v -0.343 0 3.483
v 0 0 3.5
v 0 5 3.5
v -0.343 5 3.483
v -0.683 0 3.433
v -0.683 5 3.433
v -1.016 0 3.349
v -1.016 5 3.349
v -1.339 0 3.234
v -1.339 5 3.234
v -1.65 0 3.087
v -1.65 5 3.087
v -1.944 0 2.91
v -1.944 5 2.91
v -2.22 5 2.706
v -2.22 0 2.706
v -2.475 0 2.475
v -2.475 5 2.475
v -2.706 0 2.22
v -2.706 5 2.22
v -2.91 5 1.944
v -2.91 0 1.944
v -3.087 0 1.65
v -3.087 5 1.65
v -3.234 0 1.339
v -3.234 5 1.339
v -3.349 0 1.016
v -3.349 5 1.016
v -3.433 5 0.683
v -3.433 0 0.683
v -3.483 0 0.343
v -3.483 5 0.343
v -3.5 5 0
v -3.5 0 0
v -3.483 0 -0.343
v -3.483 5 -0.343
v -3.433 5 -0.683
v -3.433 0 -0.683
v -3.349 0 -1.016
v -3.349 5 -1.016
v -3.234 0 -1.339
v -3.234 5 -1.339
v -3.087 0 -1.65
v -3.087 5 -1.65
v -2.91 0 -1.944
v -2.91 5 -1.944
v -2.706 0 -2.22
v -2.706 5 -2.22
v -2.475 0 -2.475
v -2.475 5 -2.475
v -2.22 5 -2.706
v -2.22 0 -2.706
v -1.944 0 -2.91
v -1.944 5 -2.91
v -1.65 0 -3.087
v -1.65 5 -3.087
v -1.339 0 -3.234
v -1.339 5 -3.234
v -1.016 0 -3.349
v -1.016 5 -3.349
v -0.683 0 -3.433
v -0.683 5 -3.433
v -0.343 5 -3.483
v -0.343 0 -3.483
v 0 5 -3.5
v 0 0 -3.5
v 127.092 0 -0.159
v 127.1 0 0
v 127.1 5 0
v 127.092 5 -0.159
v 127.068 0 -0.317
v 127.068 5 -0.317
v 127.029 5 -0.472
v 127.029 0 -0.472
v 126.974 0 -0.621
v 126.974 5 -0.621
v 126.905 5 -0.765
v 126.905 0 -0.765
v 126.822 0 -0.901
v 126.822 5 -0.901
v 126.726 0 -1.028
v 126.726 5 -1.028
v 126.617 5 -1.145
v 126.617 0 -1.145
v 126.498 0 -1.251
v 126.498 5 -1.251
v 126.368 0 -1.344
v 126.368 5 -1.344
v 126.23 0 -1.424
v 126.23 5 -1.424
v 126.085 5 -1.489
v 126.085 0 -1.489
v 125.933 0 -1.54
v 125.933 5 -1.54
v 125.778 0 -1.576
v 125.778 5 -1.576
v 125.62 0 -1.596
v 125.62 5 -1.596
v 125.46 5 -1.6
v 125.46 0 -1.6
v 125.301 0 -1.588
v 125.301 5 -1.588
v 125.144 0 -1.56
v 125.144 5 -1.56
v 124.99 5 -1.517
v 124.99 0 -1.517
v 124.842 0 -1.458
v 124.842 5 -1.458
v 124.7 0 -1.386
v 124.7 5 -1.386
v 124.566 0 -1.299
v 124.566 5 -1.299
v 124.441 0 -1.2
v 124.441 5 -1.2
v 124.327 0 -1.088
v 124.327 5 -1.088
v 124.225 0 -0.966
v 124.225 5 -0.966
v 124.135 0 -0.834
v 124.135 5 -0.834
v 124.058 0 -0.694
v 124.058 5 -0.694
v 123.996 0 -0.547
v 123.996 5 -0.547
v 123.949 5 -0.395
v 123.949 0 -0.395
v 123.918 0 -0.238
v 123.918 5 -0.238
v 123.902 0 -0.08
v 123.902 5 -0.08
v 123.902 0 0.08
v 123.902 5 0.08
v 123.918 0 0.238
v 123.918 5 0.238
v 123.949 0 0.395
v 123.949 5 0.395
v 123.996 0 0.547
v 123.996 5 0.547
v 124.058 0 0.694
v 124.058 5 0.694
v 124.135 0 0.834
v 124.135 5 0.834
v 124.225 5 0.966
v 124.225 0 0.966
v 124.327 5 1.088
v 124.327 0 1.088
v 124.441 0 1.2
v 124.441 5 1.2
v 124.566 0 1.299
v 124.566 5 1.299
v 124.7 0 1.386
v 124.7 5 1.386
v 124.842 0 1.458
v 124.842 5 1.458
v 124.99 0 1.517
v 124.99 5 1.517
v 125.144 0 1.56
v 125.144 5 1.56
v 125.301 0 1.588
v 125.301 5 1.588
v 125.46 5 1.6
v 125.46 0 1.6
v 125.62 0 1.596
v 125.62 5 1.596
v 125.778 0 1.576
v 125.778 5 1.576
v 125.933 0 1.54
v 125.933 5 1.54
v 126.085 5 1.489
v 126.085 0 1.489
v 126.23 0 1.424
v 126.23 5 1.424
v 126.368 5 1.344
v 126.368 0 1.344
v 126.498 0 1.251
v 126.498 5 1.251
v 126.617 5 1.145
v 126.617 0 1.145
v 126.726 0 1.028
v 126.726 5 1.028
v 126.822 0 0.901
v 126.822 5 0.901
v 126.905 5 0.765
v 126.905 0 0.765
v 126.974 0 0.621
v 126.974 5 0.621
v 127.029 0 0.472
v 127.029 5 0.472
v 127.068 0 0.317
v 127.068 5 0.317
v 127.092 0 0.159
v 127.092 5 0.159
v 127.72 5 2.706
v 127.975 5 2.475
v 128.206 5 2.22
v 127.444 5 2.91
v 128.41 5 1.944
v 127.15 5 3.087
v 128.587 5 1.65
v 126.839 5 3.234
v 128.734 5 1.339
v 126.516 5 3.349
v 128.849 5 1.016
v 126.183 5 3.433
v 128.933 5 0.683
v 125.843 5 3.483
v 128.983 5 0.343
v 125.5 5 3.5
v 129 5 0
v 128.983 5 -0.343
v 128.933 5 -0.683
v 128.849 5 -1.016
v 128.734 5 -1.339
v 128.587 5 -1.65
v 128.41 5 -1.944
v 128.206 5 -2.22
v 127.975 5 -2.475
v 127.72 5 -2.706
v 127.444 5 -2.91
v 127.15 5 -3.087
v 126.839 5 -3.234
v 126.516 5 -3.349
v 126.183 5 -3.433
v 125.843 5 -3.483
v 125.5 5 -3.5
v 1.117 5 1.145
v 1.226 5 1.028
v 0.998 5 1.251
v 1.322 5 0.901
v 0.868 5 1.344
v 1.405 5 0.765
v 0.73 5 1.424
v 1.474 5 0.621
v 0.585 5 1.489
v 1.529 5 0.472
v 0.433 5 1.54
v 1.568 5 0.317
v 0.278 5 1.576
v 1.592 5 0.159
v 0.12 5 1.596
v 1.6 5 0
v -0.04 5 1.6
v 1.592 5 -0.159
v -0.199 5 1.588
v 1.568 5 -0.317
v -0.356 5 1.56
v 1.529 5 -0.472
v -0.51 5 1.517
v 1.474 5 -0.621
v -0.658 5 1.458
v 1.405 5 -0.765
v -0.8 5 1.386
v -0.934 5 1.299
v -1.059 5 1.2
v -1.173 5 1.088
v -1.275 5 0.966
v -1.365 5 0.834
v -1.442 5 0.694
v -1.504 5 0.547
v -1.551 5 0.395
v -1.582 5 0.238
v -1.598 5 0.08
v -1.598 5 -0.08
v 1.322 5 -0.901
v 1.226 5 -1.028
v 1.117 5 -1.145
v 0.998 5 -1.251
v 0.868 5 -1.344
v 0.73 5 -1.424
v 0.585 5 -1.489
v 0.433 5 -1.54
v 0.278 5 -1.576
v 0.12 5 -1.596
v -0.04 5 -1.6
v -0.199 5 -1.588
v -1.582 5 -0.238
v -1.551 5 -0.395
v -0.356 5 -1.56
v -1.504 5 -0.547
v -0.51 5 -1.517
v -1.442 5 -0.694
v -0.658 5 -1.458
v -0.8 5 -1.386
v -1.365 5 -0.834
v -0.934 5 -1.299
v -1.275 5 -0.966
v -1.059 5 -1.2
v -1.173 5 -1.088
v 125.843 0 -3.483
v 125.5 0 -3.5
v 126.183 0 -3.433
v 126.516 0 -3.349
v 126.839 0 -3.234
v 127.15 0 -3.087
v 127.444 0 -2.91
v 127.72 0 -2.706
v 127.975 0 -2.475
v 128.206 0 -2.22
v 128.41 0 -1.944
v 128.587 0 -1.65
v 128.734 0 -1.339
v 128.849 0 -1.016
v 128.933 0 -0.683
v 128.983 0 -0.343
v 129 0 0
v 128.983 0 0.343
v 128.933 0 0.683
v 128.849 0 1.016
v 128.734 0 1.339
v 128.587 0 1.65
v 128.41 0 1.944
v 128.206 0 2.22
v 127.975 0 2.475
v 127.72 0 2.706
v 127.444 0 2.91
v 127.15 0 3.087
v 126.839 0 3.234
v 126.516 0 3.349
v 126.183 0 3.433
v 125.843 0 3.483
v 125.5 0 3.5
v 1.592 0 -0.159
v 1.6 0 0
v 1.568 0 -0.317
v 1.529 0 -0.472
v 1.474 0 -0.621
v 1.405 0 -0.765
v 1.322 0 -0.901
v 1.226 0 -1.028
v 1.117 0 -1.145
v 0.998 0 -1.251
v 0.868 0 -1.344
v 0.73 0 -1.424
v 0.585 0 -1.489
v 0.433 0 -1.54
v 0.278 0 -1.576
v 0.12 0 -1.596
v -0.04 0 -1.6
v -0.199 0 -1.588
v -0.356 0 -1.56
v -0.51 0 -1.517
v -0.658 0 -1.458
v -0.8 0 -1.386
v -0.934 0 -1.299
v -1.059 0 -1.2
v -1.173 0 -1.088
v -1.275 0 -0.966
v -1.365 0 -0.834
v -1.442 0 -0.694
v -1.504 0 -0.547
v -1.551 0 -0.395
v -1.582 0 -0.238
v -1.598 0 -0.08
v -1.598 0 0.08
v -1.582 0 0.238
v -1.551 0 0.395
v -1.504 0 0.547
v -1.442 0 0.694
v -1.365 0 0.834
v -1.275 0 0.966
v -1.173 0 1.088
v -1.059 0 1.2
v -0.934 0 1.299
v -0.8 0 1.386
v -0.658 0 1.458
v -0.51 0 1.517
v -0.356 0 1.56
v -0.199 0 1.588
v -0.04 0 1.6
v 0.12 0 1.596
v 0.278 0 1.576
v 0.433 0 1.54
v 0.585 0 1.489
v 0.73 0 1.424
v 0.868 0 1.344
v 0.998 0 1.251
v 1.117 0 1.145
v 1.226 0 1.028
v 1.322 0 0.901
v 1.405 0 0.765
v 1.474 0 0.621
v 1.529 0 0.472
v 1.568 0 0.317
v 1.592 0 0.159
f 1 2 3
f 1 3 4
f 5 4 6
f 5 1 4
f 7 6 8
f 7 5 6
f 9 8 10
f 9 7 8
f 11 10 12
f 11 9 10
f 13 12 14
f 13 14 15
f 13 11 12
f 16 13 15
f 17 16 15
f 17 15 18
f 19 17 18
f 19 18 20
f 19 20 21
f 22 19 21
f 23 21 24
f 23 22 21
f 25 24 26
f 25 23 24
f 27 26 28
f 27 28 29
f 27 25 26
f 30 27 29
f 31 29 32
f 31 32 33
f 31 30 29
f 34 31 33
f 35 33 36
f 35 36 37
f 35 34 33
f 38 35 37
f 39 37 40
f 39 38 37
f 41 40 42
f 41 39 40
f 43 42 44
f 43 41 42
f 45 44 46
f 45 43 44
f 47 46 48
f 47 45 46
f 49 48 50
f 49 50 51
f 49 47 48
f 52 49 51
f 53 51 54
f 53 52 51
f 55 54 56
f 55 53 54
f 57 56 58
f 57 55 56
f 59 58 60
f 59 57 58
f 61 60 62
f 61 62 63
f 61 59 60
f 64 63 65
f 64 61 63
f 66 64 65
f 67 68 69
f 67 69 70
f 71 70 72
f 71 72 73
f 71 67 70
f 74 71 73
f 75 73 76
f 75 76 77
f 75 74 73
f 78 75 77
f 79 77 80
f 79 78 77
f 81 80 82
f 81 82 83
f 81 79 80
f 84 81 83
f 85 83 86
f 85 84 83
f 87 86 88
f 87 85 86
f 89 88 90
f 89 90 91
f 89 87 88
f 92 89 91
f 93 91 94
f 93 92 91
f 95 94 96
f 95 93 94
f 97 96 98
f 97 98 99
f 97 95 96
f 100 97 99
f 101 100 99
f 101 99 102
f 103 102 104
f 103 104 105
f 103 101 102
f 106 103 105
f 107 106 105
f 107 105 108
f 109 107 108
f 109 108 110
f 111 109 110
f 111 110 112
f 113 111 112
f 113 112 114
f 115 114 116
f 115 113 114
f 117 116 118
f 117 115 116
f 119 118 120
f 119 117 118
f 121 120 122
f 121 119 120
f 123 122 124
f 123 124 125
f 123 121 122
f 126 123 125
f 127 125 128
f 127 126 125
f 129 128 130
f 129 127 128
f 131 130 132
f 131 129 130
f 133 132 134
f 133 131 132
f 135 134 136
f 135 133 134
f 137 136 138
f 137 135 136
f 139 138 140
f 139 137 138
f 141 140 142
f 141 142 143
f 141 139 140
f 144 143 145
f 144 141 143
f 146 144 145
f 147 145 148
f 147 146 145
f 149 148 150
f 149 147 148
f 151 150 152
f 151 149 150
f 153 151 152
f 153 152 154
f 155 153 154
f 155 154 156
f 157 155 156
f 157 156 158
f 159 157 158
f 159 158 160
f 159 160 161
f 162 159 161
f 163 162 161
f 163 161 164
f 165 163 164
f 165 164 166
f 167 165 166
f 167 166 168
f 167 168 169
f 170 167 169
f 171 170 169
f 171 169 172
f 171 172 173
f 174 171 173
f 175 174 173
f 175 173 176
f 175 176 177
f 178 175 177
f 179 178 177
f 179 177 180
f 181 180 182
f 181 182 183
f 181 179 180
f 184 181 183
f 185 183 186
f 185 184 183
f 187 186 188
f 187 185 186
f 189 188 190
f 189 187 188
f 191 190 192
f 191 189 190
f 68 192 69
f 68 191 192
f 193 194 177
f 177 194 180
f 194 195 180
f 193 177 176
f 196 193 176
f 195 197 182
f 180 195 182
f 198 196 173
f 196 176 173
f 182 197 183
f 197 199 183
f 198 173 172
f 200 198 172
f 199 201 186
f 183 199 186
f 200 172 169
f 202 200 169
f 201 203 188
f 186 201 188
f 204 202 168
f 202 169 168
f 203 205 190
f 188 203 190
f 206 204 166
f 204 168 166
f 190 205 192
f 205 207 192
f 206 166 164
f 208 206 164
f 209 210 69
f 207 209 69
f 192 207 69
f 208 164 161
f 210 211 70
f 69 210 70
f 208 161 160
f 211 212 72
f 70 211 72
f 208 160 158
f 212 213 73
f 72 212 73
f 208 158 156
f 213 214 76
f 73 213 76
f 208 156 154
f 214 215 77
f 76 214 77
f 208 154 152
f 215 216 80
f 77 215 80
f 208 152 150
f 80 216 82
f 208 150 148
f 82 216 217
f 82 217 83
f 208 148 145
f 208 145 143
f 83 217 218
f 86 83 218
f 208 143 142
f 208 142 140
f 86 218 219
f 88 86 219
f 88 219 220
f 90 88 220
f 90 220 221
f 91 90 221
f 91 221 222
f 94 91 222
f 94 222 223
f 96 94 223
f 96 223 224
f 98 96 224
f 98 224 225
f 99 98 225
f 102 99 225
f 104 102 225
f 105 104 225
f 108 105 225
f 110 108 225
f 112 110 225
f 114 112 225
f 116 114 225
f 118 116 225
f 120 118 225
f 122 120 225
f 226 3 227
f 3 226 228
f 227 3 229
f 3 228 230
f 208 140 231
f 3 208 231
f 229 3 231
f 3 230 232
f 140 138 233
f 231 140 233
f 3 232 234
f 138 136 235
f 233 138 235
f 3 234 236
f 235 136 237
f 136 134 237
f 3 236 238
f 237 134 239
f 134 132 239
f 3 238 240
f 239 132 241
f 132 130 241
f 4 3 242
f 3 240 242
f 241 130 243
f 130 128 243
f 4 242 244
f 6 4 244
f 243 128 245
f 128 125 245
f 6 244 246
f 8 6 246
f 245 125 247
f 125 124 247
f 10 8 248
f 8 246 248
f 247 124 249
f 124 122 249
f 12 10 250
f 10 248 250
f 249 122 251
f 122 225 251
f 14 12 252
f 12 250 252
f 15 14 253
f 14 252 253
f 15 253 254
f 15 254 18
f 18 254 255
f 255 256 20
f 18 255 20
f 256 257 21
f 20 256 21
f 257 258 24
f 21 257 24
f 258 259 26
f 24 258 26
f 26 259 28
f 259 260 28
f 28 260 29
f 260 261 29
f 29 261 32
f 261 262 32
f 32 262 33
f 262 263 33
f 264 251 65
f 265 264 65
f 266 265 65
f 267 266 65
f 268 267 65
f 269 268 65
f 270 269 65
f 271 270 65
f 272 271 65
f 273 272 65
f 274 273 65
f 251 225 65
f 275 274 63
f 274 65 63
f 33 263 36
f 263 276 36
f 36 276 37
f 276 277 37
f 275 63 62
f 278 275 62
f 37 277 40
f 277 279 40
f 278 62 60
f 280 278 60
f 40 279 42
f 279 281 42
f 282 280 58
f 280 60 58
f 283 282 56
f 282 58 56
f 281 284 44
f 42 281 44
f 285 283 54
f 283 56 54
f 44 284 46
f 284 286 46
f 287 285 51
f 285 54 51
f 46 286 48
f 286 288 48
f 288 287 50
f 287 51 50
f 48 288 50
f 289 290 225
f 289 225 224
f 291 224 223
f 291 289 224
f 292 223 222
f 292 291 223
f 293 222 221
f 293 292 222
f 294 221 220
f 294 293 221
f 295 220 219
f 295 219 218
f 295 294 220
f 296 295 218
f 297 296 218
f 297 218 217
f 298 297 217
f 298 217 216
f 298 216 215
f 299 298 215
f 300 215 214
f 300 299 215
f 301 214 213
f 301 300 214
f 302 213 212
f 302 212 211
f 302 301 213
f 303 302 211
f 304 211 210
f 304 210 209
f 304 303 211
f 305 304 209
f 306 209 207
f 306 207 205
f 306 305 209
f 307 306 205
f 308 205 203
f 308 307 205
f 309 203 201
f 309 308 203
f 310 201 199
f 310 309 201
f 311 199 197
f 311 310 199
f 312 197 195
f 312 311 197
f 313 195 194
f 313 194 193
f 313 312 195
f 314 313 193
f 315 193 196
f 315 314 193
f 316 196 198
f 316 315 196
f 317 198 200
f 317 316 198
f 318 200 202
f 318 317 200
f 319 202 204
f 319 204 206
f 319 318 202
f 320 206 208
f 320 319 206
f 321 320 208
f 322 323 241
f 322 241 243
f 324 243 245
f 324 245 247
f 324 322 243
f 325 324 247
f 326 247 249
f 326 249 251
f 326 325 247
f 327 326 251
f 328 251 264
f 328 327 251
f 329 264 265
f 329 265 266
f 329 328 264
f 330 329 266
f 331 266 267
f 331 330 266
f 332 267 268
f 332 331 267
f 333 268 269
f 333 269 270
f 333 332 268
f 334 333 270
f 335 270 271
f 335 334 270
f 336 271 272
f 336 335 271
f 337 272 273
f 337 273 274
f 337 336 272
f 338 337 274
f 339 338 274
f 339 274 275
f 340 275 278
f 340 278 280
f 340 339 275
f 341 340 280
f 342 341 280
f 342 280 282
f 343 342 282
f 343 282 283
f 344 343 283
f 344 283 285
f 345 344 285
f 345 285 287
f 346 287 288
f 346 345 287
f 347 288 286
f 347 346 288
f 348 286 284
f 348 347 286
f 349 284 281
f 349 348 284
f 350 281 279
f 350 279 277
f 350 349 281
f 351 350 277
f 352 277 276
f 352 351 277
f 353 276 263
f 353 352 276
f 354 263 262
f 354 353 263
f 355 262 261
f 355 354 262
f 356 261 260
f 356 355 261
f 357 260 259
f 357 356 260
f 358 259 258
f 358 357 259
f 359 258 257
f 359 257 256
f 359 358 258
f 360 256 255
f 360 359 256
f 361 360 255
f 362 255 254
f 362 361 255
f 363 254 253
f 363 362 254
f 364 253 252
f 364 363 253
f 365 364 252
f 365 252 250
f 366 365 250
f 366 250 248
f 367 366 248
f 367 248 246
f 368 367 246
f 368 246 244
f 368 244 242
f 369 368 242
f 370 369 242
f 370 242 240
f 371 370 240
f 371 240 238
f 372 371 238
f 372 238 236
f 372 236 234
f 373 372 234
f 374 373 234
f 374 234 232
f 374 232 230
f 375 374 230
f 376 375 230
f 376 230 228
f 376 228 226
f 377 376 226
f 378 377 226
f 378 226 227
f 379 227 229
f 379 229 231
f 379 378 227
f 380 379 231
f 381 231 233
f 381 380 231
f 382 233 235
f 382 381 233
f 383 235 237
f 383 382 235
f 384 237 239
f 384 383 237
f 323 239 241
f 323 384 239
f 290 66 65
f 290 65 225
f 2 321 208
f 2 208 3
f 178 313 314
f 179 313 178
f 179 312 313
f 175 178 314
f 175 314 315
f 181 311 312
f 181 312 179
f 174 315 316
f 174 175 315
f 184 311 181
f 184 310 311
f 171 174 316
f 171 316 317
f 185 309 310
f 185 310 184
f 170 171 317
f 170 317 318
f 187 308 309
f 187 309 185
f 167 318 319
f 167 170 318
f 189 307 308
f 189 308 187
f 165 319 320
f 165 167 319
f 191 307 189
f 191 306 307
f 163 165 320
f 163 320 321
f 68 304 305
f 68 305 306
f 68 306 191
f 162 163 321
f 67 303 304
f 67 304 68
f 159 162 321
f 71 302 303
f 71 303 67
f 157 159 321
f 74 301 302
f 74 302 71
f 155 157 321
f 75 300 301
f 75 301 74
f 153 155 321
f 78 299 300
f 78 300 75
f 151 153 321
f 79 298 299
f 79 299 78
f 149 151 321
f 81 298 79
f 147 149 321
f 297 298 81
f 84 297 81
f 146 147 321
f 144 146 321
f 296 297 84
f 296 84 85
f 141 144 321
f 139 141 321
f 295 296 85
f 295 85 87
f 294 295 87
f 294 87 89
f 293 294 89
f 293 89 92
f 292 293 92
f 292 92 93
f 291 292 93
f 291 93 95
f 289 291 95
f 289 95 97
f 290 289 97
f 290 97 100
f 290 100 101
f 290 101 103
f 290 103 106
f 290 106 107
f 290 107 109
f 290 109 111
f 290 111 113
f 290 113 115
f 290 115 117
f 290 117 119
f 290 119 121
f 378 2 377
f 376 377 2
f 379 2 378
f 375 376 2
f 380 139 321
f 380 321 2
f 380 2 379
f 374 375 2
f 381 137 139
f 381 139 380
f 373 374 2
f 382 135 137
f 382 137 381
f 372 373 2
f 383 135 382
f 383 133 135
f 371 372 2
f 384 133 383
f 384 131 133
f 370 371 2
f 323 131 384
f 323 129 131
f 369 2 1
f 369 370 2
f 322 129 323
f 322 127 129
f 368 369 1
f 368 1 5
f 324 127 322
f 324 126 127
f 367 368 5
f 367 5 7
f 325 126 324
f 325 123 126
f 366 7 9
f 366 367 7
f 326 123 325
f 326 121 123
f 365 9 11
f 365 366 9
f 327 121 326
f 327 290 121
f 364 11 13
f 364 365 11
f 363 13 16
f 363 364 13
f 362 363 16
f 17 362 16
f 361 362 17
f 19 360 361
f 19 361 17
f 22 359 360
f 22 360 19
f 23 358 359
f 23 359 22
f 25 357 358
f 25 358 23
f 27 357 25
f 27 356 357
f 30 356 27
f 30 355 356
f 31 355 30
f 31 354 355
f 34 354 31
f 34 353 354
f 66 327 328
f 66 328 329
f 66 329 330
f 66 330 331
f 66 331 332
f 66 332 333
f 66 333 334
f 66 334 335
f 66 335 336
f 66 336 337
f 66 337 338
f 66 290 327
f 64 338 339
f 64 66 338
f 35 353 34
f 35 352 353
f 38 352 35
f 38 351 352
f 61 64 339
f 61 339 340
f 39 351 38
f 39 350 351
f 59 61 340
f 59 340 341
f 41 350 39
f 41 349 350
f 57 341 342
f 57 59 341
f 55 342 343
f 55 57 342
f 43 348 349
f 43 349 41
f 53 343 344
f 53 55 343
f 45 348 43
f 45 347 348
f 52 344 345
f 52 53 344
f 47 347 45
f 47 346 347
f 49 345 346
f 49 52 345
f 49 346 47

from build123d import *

# Parameters (mm, degrees)
SKETCH1_R           = 1.6
BOSS_EXTRUDE1_DEPTH = 5


with BuildPart() as part:
    # Sketch1 → Boss-Extrude1 (new body)
    with BuildSketch(Plane(origin=(0, 0, 0), x_dir=(1, 0, 0), z_dir=(0, 1, 0))):
        with BuildLine():
            Line((0, 3.5), (125.5, 3.5))
            ThreePointArc((125.5, 3.5), (129, 0), (125.5, -3.5))
            Line((125.5, -3.5), (0, -3.5))
            ThreePointArc((0, -3.5), (-3.5, 0), (0, 3.5))
        make_face()
        Circle(SKETCH1_R, mode=Mode.SUBTRACT)
        with Locations((125.5, 0)):
            Circle(SKETCH1_R, mode=Mode.SUBTRACT)
    extrude(amount=BOSS_EXTRUDE1_DEPTH)


solid = part.part
